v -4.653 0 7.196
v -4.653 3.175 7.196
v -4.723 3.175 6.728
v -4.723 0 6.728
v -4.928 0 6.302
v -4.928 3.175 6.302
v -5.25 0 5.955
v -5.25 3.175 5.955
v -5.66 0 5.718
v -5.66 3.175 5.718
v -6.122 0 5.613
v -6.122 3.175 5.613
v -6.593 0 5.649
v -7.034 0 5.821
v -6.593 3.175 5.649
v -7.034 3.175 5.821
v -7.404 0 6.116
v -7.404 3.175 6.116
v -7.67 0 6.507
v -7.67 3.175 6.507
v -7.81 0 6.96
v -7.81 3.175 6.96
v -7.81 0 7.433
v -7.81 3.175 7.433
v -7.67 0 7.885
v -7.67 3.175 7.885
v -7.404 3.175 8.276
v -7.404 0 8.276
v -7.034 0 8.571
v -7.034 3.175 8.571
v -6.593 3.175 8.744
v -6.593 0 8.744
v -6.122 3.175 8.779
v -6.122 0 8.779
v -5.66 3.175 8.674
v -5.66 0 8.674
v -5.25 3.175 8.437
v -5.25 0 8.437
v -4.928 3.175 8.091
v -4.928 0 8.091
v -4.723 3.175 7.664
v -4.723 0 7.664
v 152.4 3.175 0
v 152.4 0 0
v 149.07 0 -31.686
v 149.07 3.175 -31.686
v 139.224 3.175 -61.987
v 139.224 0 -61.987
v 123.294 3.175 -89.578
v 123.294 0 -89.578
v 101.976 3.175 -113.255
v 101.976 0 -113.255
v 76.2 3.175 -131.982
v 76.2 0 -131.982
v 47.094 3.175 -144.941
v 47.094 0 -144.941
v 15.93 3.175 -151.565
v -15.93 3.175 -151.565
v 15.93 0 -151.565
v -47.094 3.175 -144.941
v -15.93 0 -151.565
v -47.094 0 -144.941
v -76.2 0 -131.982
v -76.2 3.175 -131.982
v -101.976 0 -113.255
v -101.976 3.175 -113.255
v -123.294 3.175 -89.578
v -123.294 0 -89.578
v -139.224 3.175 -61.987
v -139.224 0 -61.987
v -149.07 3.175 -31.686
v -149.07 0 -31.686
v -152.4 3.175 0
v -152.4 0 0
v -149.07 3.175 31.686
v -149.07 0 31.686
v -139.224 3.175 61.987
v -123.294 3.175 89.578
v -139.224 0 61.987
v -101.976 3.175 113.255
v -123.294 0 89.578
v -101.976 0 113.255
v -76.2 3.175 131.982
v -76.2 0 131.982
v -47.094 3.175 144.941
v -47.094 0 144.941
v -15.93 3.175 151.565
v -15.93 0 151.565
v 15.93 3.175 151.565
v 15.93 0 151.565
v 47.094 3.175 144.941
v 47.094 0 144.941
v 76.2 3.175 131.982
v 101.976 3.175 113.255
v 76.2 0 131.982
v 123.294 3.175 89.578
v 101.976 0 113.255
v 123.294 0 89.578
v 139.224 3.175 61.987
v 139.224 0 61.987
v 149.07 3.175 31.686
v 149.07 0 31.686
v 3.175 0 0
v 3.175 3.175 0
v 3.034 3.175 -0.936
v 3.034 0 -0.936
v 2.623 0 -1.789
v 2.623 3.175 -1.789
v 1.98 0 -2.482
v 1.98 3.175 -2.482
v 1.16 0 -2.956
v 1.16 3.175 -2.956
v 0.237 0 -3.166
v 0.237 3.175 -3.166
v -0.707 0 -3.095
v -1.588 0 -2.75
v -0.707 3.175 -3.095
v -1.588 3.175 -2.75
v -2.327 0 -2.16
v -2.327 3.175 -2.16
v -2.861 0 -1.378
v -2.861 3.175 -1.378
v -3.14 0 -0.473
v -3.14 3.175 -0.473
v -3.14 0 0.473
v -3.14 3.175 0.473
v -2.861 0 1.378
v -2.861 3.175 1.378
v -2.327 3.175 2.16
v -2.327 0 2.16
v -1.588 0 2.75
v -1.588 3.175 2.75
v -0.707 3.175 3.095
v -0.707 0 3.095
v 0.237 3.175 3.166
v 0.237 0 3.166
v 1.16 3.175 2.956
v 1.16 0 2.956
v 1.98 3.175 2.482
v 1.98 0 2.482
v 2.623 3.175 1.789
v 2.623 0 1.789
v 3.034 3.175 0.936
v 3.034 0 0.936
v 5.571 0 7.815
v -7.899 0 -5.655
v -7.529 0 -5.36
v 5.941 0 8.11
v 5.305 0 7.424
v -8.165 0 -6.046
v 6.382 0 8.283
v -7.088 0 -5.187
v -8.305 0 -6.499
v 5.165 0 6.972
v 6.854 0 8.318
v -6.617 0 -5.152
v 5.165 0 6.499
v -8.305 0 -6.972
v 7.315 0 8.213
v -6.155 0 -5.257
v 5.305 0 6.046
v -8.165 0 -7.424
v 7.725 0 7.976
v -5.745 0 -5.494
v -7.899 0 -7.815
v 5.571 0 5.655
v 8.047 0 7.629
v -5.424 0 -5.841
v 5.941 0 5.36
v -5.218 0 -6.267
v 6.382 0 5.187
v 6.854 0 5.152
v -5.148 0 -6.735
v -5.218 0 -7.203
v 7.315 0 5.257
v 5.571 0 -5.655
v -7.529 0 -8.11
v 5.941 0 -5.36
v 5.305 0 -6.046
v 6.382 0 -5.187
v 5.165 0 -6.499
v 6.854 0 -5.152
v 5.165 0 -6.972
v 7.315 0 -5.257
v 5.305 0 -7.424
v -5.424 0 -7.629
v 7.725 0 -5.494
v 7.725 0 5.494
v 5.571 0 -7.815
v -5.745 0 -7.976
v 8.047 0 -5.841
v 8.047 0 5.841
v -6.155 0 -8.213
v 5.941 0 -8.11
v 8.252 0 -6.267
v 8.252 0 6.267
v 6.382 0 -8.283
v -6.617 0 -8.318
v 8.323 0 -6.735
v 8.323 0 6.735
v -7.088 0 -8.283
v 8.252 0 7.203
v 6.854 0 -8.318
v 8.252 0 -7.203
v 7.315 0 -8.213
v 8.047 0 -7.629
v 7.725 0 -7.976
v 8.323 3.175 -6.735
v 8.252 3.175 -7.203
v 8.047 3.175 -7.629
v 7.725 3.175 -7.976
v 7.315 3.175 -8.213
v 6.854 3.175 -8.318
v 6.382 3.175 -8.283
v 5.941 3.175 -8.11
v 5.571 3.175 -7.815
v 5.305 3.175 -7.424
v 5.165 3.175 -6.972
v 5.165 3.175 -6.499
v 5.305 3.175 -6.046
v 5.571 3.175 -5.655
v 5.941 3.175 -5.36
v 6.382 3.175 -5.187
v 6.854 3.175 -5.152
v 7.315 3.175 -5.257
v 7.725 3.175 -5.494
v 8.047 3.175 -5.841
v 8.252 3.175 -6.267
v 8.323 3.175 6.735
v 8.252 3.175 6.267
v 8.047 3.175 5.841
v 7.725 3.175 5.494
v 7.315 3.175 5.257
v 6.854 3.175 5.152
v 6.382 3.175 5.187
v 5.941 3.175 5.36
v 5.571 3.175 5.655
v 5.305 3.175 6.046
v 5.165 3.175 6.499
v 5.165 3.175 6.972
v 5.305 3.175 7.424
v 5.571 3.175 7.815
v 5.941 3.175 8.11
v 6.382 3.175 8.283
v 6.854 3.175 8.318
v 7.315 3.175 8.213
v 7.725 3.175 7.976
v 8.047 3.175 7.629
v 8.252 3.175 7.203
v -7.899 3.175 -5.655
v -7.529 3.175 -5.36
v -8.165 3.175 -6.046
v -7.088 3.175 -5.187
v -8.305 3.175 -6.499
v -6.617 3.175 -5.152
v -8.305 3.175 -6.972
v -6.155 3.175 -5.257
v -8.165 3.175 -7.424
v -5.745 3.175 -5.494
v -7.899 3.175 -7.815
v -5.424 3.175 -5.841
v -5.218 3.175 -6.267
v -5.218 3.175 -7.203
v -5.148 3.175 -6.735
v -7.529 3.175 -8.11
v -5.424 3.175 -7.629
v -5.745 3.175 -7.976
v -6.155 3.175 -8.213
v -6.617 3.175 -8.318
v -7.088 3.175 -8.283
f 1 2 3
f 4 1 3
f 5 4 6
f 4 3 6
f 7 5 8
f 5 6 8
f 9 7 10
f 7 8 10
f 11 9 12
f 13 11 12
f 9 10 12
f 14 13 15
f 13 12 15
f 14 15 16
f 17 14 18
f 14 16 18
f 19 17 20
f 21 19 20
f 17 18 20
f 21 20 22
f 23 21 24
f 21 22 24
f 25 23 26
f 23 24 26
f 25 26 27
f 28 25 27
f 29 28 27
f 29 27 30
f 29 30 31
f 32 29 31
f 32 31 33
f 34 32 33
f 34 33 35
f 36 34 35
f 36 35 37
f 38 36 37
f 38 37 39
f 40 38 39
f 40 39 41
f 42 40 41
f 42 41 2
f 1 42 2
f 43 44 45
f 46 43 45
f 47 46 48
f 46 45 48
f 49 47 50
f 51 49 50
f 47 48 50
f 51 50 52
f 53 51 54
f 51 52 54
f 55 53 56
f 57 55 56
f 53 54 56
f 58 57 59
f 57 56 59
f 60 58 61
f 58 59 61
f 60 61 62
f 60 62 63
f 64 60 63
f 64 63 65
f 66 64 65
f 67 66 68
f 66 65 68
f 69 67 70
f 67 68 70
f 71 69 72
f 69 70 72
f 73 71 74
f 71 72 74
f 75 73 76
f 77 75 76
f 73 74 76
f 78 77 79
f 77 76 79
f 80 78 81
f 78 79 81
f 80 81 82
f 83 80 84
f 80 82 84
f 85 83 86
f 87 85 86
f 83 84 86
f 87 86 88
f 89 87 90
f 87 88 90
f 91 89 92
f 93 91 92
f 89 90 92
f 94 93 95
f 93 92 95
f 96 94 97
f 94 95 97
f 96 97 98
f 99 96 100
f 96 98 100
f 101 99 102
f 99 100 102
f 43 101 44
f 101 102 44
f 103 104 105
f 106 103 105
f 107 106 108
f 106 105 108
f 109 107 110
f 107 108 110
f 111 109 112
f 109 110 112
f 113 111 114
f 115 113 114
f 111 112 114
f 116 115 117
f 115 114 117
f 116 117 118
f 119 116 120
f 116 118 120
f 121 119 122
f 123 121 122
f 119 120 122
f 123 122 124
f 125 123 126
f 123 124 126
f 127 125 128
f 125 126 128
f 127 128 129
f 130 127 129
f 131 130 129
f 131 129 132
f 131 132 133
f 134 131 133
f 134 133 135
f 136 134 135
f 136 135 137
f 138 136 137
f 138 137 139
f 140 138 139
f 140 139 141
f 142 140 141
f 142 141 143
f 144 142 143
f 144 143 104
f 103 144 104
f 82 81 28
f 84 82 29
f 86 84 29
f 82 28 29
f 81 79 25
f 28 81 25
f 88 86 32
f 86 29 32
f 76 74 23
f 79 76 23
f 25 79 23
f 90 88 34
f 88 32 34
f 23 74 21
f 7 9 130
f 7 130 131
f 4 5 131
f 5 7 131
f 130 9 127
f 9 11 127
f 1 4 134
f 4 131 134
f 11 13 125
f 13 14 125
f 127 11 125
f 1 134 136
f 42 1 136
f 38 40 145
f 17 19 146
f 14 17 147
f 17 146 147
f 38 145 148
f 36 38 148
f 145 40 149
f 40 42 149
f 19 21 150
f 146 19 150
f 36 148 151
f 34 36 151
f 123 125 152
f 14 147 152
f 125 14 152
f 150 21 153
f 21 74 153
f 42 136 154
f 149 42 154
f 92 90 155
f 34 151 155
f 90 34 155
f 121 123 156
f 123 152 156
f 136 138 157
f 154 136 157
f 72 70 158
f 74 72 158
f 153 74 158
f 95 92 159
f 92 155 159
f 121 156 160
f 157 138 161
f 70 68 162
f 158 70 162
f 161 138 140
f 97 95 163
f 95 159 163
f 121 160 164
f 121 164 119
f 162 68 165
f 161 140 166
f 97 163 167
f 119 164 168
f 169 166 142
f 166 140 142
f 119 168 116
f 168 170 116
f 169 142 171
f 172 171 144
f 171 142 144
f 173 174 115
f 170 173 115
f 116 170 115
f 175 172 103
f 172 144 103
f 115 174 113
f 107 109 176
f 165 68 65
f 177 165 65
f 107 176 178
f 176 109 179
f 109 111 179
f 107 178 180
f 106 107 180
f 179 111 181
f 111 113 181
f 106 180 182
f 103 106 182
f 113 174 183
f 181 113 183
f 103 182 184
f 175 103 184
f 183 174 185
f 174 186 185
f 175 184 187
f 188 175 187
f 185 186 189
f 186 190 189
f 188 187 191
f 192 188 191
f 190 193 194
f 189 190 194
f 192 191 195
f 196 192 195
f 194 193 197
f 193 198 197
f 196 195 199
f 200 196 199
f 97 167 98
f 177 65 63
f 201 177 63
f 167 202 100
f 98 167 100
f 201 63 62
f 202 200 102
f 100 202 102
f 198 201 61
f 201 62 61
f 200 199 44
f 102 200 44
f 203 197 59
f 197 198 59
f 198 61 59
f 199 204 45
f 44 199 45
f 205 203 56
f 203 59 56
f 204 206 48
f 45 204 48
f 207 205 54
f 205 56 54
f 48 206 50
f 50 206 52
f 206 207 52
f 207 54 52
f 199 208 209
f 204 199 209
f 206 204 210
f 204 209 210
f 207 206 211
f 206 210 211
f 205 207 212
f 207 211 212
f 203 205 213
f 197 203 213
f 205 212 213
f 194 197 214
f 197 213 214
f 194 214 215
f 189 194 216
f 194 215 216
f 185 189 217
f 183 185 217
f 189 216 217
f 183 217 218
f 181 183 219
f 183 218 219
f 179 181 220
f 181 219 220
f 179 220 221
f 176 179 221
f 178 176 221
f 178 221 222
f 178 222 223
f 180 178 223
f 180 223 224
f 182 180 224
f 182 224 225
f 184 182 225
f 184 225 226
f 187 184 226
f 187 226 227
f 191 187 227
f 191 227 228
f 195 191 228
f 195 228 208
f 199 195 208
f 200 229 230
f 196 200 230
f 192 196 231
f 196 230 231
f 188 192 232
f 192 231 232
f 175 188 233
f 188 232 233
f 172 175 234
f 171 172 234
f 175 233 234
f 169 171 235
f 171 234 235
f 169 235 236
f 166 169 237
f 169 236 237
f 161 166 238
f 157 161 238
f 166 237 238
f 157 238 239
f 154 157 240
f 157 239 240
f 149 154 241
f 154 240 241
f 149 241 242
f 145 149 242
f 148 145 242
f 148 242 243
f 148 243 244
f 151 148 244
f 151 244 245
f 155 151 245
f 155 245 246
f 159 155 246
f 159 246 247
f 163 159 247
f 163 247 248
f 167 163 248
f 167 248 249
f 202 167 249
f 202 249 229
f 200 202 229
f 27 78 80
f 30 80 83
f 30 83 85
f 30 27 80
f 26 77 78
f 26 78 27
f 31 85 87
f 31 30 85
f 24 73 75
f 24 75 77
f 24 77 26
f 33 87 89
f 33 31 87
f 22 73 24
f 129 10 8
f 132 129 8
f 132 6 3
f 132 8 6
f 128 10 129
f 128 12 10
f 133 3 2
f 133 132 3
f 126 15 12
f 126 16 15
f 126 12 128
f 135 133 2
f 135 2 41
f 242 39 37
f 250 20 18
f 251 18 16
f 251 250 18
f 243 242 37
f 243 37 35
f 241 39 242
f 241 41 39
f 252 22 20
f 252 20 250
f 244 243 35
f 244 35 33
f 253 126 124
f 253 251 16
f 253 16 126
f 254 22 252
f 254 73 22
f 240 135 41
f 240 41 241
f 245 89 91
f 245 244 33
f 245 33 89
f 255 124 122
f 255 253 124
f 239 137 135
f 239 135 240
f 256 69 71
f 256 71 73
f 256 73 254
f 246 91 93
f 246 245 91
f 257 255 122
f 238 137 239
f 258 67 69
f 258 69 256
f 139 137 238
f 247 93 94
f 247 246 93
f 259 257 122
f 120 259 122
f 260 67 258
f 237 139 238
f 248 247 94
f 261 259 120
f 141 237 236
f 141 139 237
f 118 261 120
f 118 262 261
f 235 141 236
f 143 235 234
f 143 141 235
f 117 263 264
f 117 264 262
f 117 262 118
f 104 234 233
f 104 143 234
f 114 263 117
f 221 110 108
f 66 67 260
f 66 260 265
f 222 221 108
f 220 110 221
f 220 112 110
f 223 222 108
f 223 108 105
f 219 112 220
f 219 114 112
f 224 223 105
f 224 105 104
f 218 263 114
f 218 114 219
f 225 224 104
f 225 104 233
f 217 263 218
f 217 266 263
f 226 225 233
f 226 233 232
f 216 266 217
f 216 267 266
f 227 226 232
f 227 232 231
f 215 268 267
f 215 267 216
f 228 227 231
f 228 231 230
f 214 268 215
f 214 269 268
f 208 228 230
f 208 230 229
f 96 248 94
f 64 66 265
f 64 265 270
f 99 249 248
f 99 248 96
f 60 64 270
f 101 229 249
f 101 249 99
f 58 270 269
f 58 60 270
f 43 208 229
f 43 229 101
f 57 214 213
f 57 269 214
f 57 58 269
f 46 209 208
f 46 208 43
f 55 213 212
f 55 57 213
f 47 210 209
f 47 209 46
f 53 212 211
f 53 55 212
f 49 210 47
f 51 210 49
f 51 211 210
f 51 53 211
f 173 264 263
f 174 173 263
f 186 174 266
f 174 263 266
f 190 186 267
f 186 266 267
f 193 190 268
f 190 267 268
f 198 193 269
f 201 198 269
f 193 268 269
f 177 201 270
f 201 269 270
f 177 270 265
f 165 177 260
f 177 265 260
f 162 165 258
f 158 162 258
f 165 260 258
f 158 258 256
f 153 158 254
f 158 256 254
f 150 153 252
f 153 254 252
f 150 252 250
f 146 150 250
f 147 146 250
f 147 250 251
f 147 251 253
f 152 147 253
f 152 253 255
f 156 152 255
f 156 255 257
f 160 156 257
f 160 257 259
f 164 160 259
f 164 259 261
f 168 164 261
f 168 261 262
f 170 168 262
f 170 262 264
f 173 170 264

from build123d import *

# Parameters (mm, degrees)
SKETCH1_R           = 152.4
BOSS_EXTRUDE1_DEPTH = 3.175
CUT_EXTRUDE1_REACH  = 5.175
SKETCH2_R           = 3.175
SKETCH2_R_2         = 1.5875


with BuildPart() as part:
    # Sketch1 → Boss-Extrude1 (new body)
    with BuildSketch(Plane(origin=(0, 0, 0), x_dir=(1, 0, 0), z_dir=(0, 1, 0))):
        Circle(SKETCH1_R)
    extrude(amount=BOSS_EXTRUDE1_DEPTH)

    # Sketch2 → Cut-Extrude1 (cut, up to next)
    with BuildSketch(Plane(origin=(0, 3.175, 0), x_dir=(1, 0, 0), z_dir=(0, 1, 0)), mode=Mode.PRIVATE) as cut_extrude1_sk1:
        Circle(SKETCH2_R)
    cut_extrude1_tool1 = extrude(cut_extrude1_sk1.sketch, amount=-CUT_EXTRUDE1_REACH, mode=Mode.PRIVATE) & part.part
    add(cut_extrude1_tool1.solids().sort_by_distance((0, 3.175, 0))[0], mode=Mode.SUBTRACT)
    # Sketch2 → Cut-Extrude1 (cut, up to next)
    with BuildSketch(Plane(origin=(0, 3.175, 0), x_dir=(1, 0, 0), z_dir=(0, 1, 0)), mode=Mode.PRIVATE) as cut_extrude1_sk2:
        with Locations((6.735192091, 6.735192091)):
            Circle(SKETCH2_R_2)
    cut_extrude1_tool2 = extrude(cut_extrude1_sk2.sketch, amount=-CUT_EXTRUDE1_REACH, mode=Mode.PRIVATE) & part.part
    add(cut_extrude1_tool2.solids().sort_by_distance((6.735192, 3.175, -6.735192))[0], mode=Mode.SUBTRACT)
    # Sketch2 → Cut-Extrude1 (cut, up to next)
    with BuildSketch(Plane(origin=(0, 3.175, 0), x_dir=(1, 0, 0), z_dir=(0, 1, 0)), mode=Mode.PRIVATE) as cut_extrude1_sk3:
        with Locations((-6.735192091, 6.735192091)):
            Circle(SKETCH2_R_2)
    cut_extrude1_tool3 = extrude(cut_extrude1_sk3.sketch, amount=-CUT_EXTRUDE1_REACH, mode=Mode.PRIVATE) & part.part
    add(cut_extrude1_tool3.solids().sort_by_distance((-6.735192, 3.175, -6.735192))[0], mode=Mode.SUBTRACT)
    # Sketch2 → Cut-Extrude1 (cut, up to next)
    with BuildSketch(Plane(origin=(0, 3.175, 0), x_dir=(1, 0, 0), z_dir=(0, 1, 0)), mode=Mode.PRIVATE) as cut_extrude1_sk4:
        with Locations((-6.240150163, -7.19625951)):
            Circle(SKETCH2_R_2)
    cut_extrude1_tool4 = extrude(cut_extrude1_sk4.sketch, amount=-CUT_EXTRUDE1_REACH, mode=Mode.PRIVATE) & part.part
    add(cut_extrude1_tool4.solids().sort_by_distance((-6.24015, 3.175, 7.19626))[0], mode=Mode.SUBTRACT)
    # Sketch2 → Cut-Extrude1 (cut, up to next)
    with BuildSketch(Plane(origin=(0, 3.175, 0), x_dir=(1, 0, 0), z_dir=(0, 1, 0)), mode=Mode.PRIVATE) as cut_extrude1_sk5:
        with Locations((6.735192091, -6.735192091)):
            Circle(SKETCH2_R_2)
    cut_extrude1_tool5 = extrude(cut_extrude1_sk5.sketch, amount=-CUT_EXTRUDE1_REACH, mode=Mode.PRIVATE) & part.part
    add(cut_extrude1_tool5.solids().sort_by_distance((6.735192, 3.175, 6.735192))[0], mode=Mode.SUBTRACT)


solid = part.part
